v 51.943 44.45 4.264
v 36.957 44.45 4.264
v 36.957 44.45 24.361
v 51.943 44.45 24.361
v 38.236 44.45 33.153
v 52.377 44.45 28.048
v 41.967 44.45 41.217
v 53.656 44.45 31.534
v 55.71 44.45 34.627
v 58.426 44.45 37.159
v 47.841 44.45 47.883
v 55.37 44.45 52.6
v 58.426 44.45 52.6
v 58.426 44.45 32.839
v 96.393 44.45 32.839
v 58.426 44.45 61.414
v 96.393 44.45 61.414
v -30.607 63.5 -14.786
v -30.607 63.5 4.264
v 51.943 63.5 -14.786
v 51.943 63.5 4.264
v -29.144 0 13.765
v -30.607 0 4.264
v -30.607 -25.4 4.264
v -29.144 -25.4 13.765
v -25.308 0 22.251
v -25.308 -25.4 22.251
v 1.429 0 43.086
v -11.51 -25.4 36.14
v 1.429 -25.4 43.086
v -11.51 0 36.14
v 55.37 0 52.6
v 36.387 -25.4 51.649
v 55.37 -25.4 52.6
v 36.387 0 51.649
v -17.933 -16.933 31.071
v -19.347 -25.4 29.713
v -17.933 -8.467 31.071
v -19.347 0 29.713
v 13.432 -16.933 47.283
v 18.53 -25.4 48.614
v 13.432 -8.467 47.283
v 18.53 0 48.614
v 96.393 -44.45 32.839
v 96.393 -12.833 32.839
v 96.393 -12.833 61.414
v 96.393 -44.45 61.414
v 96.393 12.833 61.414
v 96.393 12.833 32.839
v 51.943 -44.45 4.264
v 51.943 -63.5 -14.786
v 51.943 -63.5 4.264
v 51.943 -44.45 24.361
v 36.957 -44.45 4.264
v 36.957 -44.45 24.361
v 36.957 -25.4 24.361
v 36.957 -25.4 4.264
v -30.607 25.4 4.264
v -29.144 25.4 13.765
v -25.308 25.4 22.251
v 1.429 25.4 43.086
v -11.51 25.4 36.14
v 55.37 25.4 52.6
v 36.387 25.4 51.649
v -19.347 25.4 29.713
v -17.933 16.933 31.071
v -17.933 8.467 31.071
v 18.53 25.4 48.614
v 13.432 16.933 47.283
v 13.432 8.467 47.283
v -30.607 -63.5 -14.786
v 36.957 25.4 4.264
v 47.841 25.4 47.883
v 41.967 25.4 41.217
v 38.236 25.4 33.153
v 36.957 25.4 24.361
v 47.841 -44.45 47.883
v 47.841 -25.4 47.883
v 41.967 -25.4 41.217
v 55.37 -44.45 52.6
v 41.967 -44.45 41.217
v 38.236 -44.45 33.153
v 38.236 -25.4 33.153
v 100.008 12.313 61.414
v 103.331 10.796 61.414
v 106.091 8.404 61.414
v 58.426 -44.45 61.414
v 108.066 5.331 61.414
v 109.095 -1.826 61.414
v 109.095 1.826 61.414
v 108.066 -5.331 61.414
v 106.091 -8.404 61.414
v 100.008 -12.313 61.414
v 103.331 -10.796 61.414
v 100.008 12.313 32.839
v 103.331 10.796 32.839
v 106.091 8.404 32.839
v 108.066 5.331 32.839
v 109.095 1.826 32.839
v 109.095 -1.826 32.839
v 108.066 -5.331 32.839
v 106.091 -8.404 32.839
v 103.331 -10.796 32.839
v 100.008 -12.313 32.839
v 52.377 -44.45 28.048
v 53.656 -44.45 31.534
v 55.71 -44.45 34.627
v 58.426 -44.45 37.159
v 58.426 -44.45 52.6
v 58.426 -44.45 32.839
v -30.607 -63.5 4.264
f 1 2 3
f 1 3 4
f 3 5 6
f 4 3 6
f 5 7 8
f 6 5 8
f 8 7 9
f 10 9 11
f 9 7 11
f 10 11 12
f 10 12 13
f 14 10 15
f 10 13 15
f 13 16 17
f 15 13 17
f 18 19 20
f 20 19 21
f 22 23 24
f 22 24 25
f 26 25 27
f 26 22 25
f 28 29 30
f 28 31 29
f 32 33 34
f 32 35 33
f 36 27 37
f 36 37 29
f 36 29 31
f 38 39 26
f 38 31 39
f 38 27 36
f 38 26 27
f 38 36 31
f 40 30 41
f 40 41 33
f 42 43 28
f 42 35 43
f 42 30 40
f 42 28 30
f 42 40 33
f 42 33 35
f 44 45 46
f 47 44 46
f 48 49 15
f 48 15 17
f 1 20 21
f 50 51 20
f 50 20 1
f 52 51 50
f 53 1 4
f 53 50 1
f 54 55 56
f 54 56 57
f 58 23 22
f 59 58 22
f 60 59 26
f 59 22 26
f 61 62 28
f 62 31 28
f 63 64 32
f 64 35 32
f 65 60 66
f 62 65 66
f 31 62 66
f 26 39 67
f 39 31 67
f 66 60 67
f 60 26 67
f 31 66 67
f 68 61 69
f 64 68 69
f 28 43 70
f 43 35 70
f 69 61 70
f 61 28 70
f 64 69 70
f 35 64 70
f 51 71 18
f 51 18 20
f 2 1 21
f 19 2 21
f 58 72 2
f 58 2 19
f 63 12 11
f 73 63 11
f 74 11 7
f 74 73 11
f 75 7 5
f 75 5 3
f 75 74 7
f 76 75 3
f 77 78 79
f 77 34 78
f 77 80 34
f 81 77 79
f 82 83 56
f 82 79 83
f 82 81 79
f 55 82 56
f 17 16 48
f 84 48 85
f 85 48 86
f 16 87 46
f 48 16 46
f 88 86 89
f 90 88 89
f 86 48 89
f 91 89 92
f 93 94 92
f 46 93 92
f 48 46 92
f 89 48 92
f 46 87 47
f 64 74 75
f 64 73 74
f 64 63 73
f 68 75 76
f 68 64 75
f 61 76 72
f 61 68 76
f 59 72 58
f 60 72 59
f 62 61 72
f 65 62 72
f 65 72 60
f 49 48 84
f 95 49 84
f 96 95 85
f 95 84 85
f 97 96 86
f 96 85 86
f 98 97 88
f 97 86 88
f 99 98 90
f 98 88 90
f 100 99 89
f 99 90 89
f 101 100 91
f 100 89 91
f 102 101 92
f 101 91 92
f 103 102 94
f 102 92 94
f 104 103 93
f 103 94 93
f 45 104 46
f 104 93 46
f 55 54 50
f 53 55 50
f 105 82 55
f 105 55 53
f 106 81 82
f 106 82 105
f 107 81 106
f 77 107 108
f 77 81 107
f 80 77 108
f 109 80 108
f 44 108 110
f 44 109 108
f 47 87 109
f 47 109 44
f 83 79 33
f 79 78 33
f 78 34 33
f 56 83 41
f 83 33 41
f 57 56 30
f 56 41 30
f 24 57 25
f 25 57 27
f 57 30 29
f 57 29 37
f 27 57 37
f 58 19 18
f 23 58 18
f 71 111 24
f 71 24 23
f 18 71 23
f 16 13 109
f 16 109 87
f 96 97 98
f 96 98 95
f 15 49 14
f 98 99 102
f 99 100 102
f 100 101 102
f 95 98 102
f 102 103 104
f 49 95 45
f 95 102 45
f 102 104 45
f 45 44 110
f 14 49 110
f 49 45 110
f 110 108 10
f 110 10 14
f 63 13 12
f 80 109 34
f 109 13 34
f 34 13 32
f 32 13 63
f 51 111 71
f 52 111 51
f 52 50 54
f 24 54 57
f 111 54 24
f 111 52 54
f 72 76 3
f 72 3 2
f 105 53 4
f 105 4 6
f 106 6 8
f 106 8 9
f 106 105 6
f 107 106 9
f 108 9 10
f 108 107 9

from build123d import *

# Parameters (mm, degrees)
F1_DEPTH = 63.5
F2_DEPTH = 25.4
F0_W     = 37.9670182306
F0_H     = 8.8137983387
F3_DEPTH = 44.45


with BuildPart() as f1:
    # F0 (on Front) → F1 (new body, symmetric)
    with BuildSketch(Plane.XZ):
        Polygon((36.9568020105, 4.2637886968), (-30.6071963282, 4.2637886968), (-30.6071963282, -14.7862113032), (51.9428036718, -14.7862113032), (51.9428036718, 4.2637886968), align=None)
    extrude(amount=F1_DEPTH, both=True)

    # F0 (on Front) → F2 (join, symmetric)
    with BuildSketch(Plane.XZ):
        with BuildLine():
            add(Edge.make_bspline(
                [(-30.6071963282, 4.2637886968), (-29.9851279706, 36.267735064), (10.8517641202, 52.8309457004), (55.3704965091, 52.5999903581)],
                knots=[0, 0, 0, 0, 98.6334226145, 98.6334226145, 98.6334226145, 98.6334226145], degree=3))
            Line((-30.6071963282, 4.2637886968), (36.9568020105, 4.2637886968))
            Line((36.9568020105, 4.2637886968), (36.9568020105, 24.3605504215))
            ThreePointArc((36.9568020105, 24.3605504215), (41.9669062931, 41.2167815618), (55.3704965091, 52.5999903581))
        make_face()
    extrude(amount=F2_DEPTH, both=True)

    # F0 (on Front) → F3 (join, symmetric)
    with BuildSketch(Plane.XZ):
        with BuildLine():
            Line((36.9568020105, 24.3605504215), (36.9568020105, 4.2637886968))
            Line((36.9568020105, 4.2637886968), (51.9428036718, 4.2637886968))
            Line((51.9428036718, 4.2637886968), (51.9428036718, 24.3605504215))
            ThreePointArc((51.9428036718, 24.3605504215), (53.6559903273, 31.5340201394), (58.4257854412, 37.1592073258))
            Line((58.4257854412, 37.1592073258), (58.4257854412, 52.5999903581))
            Line((58.4257854412, 52.5999903581), (55.3704965091, 52.5999903581))
            ThreePointArc((55.3704965091, 52.5999903581), (41.9669062931, 41.2167815618), (36.9568020105, 24.3605504215))
        make_face()
        with BuildLine():
            Line((96.3928036718, 52.5999903581), (58.4257854412, 52.5999903581))
            Line((58.4257854412, 52.5999903581), (58.4257854412, 37.1592073258))
            ThreePointArc((58.4257854412, 37.1592073258), (58.7496754638, 37.3906953095), (59.0792683894, 37.6139886968))
            Line((59.0792683894, 37.6139886968), (96.3928036718, 37.6139886968))
            Line((96.3928036718, 37.6139886968), (96.3928036718, 52.5999903581))
        make_face()
        with BuildLine():
            ThreePointArc((59.0792683894, 37.6139886968), (58.7496754638, 37.3906953095), (58.4257854412, 37.1592073258))
            Line((58.4257854412, 37.1592073258), (58.4257854412, 32.8387886968))
            Line((58.4257854412, 32.8387886968), (96.3928036718, 32.8387886968))
            Line((96.3928036718, 32.8387886968), (96.3928036718, 37.6139886968))
            Line((96.3928036718, 37.6139886968), (59.0792683894, 37.6139886968))
        make_face()
        with Locations((77.4092945565, 57.0068895275)):
            Rectangle(F0_W, F0_H)
    extrude(amount=F3_DEPTH, both=True)

    # F0 (on Front) → F4 (revolve)
    with BuildSketch(Plane.XZ):
        Polygon((96.3928036718, 61.4137886968), (96.3928036718, 52.5999903581), (96.3928036718, 37.6139886968), (96.3928036718, 32.8387886968), (109.2257854412, 32.8387886968), (109.2257854412, 61.4137886968), align=None)
    revolve(axis=Axis((96.3928036718, 0, 49.5138886968), (0, 0, -1)))


solid = f1.part
